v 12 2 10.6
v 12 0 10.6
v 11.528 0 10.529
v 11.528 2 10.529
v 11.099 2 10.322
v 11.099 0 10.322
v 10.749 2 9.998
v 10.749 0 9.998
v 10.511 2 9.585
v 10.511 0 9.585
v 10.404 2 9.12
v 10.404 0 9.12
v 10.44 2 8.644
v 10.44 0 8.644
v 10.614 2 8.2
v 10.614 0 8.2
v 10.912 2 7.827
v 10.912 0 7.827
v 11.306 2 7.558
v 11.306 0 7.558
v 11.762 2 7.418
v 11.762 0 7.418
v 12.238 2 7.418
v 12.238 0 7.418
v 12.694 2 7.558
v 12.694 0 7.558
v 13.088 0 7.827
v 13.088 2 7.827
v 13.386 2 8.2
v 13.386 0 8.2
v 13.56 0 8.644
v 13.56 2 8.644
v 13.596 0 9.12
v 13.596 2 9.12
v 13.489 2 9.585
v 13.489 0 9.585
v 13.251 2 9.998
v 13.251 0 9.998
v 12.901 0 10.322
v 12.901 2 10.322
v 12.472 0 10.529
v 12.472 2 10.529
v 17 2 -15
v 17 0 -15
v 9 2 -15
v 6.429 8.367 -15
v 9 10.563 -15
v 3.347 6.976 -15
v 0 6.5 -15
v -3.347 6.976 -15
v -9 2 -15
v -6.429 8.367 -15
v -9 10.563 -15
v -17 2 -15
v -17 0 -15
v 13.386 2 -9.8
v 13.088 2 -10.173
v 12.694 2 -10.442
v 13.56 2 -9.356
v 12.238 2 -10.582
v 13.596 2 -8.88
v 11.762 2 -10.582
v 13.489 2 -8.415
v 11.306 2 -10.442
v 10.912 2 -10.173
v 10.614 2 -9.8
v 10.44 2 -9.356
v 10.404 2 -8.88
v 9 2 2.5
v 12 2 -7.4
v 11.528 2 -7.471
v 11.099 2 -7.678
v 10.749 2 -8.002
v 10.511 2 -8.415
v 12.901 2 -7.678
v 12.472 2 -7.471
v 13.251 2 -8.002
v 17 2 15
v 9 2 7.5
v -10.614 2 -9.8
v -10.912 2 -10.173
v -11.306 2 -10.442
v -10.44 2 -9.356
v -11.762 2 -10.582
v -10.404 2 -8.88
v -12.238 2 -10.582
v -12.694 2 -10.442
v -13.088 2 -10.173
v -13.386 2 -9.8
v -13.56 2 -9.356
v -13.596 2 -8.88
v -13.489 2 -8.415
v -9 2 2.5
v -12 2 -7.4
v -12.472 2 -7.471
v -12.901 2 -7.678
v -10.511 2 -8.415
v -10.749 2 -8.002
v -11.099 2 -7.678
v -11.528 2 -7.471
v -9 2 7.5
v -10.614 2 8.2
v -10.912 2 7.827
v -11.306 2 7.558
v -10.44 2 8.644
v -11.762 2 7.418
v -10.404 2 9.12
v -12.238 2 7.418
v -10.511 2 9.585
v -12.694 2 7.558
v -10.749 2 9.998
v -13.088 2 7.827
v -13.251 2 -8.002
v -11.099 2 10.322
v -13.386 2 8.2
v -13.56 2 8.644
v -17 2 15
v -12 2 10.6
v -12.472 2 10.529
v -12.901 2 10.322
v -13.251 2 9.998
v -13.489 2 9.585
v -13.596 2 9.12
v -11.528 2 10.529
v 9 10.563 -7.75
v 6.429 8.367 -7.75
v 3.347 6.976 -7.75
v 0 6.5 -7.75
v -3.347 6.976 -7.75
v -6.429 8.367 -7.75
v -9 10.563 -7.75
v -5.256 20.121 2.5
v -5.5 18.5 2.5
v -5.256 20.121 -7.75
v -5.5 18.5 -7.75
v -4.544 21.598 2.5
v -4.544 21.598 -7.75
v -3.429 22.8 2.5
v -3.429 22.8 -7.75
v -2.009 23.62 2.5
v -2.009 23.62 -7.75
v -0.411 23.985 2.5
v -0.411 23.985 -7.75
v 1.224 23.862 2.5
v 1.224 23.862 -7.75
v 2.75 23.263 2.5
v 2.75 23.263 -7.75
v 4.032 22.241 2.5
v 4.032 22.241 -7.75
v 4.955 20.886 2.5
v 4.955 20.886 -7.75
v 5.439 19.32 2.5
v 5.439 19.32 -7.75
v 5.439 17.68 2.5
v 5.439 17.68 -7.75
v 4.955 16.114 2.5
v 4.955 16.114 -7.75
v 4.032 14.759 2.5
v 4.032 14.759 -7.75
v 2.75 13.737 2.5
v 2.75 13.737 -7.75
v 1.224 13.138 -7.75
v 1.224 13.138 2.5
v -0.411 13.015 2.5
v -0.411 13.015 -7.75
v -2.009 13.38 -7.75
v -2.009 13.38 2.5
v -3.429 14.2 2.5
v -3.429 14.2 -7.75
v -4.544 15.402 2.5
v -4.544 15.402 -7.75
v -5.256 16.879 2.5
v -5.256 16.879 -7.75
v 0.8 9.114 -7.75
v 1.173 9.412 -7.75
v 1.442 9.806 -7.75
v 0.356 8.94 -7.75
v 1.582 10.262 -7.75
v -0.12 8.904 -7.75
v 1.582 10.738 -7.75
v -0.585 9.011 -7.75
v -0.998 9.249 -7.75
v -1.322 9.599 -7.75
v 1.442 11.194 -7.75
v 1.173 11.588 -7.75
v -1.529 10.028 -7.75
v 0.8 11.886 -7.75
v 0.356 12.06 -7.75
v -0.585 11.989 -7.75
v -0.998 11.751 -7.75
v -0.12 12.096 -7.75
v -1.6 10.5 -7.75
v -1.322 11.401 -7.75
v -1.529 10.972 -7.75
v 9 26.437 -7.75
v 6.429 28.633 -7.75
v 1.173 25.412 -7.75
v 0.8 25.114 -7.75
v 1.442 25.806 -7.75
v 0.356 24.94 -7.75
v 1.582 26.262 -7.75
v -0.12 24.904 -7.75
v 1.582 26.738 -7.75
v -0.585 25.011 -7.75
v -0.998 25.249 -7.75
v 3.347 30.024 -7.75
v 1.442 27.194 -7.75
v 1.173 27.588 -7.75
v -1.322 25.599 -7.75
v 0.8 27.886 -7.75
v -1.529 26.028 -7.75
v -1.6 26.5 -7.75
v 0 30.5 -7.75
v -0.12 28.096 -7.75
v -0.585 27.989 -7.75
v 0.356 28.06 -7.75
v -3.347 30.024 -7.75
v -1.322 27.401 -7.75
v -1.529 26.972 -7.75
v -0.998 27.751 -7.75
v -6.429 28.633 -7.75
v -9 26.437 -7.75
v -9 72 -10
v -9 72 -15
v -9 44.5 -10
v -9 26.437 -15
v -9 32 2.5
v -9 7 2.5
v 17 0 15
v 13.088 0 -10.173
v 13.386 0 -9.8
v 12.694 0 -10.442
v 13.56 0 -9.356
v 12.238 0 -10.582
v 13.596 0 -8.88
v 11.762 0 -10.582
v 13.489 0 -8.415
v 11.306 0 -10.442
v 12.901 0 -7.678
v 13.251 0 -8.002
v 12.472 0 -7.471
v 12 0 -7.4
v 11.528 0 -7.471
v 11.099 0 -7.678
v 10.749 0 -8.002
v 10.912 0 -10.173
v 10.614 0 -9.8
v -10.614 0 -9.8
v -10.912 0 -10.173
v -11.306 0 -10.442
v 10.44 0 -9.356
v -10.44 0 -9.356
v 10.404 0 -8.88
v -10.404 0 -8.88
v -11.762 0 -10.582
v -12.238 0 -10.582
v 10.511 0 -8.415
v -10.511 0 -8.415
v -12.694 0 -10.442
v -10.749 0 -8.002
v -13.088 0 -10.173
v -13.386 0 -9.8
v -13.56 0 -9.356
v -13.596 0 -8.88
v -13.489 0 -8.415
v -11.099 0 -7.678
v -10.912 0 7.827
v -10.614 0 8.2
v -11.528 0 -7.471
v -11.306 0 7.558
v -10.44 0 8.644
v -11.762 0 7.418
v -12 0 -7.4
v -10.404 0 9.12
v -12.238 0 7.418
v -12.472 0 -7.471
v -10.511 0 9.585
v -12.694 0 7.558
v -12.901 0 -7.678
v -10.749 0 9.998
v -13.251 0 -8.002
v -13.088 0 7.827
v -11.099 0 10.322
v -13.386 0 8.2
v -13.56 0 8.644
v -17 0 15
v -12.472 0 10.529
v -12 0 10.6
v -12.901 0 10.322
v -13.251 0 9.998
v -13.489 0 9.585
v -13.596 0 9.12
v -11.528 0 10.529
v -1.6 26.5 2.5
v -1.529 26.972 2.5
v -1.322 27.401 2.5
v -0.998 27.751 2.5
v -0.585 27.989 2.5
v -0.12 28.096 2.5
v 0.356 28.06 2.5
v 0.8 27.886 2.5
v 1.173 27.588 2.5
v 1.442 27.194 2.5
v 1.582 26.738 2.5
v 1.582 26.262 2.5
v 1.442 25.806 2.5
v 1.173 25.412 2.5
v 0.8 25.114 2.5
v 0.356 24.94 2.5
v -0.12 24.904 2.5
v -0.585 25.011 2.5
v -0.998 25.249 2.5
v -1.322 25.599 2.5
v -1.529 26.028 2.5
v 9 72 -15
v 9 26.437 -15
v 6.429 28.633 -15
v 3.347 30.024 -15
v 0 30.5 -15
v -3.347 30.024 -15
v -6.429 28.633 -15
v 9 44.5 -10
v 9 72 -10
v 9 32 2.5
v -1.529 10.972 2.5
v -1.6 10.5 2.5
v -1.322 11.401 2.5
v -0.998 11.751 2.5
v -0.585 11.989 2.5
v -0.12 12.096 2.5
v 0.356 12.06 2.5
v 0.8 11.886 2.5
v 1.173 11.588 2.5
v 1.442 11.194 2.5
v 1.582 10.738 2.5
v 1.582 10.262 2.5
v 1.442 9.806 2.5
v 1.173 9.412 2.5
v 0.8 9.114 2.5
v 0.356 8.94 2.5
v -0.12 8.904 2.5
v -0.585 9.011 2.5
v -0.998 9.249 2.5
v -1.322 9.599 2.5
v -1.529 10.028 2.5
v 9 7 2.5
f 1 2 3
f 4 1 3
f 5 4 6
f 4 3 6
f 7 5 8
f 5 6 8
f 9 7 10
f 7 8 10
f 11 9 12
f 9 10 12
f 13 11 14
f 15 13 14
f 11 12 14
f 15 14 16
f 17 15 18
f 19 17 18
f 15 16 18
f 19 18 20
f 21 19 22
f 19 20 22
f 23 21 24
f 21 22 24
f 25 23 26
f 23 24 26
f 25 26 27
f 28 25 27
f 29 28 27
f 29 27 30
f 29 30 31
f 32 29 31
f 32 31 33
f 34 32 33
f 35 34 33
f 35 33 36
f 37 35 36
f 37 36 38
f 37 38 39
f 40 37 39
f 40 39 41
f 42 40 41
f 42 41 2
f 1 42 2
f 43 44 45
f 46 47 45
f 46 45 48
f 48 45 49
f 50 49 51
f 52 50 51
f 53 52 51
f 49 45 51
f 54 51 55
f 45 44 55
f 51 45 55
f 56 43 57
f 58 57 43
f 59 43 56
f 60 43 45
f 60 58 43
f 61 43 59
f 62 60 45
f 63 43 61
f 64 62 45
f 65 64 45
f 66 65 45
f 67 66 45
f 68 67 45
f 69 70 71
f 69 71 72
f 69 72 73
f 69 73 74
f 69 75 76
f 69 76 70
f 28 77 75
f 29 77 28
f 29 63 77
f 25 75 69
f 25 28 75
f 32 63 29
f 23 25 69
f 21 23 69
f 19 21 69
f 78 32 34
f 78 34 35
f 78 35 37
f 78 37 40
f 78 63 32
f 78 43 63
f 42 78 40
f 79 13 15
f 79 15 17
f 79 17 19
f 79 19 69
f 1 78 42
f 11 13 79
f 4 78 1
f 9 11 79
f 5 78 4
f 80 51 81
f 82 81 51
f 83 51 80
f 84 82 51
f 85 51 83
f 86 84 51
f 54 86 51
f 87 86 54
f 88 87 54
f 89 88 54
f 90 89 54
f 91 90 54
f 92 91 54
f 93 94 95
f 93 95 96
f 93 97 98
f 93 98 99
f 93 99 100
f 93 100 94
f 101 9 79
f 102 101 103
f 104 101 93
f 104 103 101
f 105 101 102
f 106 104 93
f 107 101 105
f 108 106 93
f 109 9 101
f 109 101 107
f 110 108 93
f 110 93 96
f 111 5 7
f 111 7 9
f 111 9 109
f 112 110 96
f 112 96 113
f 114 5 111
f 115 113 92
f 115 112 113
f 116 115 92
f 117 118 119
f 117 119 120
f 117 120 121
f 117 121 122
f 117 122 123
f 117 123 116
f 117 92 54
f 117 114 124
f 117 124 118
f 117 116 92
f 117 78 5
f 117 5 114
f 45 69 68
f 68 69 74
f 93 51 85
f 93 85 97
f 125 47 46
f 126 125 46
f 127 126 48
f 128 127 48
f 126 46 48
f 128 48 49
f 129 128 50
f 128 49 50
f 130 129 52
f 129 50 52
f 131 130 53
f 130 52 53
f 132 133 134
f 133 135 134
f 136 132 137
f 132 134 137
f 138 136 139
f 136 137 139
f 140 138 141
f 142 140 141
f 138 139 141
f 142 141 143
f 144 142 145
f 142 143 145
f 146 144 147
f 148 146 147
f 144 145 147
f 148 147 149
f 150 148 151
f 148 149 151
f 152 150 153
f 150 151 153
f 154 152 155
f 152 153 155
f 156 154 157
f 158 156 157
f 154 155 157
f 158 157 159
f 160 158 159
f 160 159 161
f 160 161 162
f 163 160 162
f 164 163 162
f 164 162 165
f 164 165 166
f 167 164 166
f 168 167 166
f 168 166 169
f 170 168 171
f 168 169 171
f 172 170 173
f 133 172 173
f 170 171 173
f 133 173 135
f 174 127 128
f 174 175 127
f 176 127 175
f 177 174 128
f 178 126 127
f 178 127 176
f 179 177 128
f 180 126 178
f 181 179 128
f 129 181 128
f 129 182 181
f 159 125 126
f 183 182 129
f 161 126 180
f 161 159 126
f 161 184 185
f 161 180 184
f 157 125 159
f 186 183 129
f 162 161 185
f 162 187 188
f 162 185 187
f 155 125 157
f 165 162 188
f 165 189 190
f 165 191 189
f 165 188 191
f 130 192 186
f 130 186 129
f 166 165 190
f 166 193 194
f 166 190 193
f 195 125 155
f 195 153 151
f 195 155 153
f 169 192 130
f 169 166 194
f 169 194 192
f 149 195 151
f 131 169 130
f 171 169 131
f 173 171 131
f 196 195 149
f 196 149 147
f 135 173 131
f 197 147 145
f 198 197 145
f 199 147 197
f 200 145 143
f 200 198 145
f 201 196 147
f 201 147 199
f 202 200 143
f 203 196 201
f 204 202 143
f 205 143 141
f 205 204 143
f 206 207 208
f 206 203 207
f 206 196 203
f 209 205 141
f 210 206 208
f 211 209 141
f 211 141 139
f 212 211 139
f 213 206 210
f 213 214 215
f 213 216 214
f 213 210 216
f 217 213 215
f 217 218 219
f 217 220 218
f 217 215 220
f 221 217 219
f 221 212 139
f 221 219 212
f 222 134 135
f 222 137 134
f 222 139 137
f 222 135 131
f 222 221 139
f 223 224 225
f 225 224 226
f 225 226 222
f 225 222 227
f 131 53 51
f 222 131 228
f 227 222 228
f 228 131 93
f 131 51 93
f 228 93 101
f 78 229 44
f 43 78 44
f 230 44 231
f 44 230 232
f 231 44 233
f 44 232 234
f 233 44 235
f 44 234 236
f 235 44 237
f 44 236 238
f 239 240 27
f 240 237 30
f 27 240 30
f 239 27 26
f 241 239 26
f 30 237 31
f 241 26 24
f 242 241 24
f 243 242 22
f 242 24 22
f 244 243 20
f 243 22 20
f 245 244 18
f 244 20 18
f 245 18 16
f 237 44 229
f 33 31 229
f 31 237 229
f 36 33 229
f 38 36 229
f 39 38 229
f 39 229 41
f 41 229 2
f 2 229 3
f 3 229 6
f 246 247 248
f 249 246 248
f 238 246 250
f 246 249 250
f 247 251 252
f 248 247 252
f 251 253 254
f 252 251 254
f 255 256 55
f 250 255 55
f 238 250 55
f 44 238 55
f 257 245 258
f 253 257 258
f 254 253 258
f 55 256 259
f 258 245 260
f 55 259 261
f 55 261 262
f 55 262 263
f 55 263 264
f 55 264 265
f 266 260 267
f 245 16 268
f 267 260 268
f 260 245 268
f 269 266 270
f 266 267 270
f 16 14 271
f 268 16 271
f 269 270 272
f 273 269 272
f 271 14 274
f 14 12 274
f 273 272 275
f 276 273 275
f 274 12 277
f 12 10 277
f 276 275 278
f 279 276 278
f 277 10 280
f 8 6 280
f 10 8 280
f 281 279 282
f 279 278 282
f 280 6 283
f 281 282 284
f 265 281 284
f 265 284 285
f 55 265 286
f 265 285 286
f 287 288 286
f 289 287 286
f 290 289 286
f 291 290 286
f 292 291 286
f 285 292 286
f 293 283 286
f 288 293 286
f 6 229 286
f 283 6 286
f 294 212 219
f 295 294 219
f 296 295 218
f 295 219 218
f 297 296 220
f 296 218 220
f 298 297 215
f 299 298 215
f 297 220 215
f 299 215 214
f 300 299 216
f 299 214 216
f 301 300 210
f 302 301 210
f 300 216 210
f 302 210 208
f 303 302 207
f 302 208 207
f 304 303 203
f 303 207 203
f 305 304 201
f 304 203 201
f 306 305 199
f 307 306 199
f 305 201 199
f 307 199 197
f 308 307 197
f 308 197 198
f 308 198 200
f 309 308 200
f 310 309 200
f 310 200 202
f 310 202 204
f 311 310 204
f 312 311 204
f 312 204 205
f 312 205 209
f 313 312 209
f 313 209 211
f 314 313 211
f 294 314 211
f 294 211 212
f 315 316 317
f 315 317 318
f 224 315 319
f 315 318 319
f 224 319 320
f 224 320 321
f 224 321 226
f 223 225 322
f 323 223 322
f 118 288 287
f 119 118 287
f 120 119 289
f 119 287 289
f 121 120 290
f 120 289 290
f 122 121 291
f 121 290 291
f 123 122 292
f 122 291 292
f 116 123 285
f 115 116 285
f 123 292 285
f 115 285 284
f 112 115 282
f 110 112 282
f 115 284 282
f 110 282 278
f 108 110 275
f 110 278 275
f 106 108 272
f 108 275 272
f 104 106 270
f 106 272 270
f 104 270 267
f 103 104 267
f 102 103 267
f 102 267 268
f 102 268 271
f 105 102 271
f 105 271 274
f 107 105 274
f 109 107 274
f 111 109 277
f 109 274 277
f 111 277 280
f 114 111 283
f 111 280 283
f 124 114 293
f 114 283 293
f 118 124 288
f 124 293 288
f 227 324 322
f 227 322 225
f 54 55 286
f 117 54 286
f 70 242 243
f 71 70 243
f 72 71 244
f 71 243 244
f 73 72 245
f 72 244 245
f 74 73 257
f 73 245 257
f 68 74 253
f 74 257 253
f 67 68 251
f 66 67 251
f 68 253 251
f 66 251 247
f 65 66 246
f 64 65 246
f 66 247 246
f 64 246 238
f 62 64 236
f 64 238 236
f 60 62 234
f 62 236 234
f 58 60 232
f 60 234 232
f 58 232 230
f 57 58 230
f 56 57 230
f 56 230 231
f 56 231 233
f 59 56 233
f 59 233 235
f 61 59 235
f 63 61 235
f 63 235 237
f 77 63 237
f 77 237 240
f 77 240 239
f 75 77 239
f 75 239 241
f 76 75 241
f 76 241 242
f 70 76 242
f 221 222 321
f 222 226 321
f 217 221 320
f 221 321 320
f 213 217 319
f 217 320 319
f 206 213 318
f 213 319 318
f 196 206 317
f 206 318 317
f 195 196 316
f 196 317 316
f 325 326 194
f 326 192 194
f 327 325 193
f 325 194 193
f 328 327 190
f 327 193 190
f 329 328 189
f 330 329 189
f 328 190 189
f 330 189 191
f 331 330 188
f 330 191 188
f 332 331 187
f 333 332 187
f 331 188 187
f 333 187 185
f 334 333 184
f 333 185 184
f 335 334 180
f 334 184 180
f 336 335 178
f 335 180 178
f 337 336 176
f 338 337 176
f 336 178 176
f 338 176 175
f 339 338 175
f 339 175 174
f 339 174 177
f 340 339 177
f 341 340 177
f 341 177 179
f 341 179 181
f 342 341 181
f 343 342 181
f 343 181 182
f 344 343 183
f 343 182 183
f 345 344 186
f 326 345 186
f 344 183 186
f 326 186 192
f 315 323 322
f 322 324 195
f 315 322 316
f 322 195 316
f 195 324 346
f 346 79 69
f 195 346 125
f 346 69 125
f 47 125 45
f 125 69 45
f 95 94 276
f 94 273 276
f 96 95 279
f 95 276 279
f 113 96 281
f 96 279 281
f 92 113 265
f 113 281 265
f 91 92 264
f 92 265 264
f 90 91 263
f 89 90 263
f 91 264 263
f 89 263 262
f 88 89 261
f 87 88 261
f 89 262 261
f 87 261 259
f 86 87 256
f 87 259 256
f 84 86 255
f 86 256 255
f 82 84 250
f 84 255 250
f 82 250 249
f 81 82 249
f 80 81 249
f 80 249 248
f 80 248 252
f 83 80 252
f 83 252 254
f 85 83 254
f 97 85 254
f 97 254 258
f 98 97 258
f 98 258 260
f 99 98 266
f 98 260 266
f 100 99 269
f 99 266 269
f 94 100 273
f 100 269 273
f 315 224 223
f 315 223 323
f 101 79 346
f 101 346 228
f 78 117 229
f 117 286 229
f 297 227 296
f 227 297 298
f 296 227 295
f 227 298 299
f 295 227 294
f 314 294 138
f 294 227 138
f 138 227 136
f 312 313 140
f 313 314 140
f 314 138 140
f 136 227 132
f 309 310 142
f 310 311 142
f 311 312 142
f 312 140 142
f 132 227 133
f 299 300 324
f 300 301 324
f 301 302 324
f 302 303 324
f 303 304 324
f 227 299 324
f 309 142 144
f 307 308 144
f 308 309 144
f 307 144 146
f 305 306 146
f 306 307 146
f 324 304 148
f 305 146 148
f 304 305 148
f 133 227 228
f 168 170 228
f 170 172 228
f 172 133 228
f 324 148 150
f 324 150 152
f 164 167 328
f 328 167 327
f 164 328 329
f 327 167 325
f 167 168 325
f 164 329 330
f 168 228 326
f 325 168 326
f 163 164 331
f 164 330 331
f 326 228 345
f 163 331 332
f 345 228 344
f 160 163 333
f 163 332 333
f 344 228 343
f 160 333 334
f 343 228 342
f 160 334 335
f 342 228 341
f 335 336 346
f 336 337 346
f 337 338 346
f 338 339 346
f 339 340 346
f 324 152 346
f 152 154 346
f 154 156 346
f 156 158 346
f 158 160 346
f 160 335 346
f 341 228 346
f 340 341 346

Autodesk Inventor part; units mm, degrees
ref_plane "YZ Plane" through (0, 0, 0) normal (1, 0, 0) x (0, 1, 0)
ref_plane "XZ Plane" through (0, 0, 0) normal (0, 1, 0) x (-1, 0, 0)
ref_plane "XY Plane" through (0, 0, 0) normal (0, 0, 1) x (1, 0, 0)
sketch "Sketch1" plane through (0, 0, 0) normal (0, 1, 0) x (-1, 0, 0)
  line L0 (-17, -15) -> (17, -15)
  line L1 (17, -15) -> (17, 15)
  line L2 (17, 15) -> (-17, 15)
  line L3 (-17, 15) -> (-17, -15)
  line L4 (-17, -15) -> (17, 15) construction
  line L5 (17, -15) -> (-17, 15) construction
  point P0 (0, 0)
  dimension "d0" = 34
  dimension "d1" = 30
extrude "Extrusion1" add sketch "Sketch1" along normal blind 2
sketch "Sketch2" plane through (0, 2, 0) normal (0, 1, 0) x (1, 0, 0)
  line L0 (-17, 15) -> (-17, -15) projected
  line L1 (-17, -15) -> (17, -15) projected
  line L2 (17, -15) -> (17, 15) projected
  line L3 (17, 15) -> (-17, 15) projected
  line L4 (-12, 9) -> (-12, -9) construction
  line L5 (-12, -9) -> (12, -9) construction
  line L6 (12, -9) -> (12, 9) construction
  line L7 (-12, 0) -> (0, 0) construction
  line L8 (0, 0) -> (0, -9) construction
  dimension "d5" = 24
  dimension "d6" = 18
hole "Hole1" at (-12, 2, -9) at (-12, 2, 9) at (12, 2, 9) at (12, 2, -9) direction (0, -1, 0) diameter 3.2 end through all
sketch "Sketch3" plane through (0, 2, 0) normal (0, 1, 0) x (1, 0, 0)
  circle A0 centre (12, 9) radius 1.6 projected
  circle A1 centre (12, -9) radius 1.6 projected
  circle A2 centre (-12, -9) radius 1.6 projected
  circle A3 centre (-12, 9) radius 1.6 projected
  line L0 (-17, 15) -> (-17, -15) projected
  line L1 (-17, -15) -> (17, -15) projected
  line L2 (17, -15) -> (17, 15) projected
  line L3 (17, 15) -> (-17, 15) projected
  line L4 (-17, -2.5) -> (17, -2.5)
  circle A4 centre (-12, 9) radius 3
  circle A5 centre (12, 9) radius 3
  line L5 (-9, 15) -> (-9, -15)
  line L6 (9, 15) -> (9, -15)
  point P0 (0, 0)
  point P1 (9, -2.5)
  point P2 (-9, -2.5)
  dimension "d14" = 17.5
  dimension "d15" = 6
  dimension "d16" = 8
  dimension "d17" = 8
extrude "Extrusion2" add sketch "Sketch3" along normal blind 30 contours L3 L6 L4 L5
sketch "Sketch4" plane through (17, 0, -15) normal (0, 0, -1) x (-1, 0, 0)
  line L0 (0, 0) -> (34, 0) projected
  line L1 (34, 0) -> (34, 2) projected
  line L2 (26, 2) -> (34, 2) projected
  line L3 (26, 2) -> (26, 32) projected
  line L4 (8, 32) -> (26, 32) projected
  line L5 (8, 2) -> (8, 32) projected
  line L6 (0, 2) -> (8, 2) projected
  line L7 (0, 0) -> (0, 2) projected
  circle A0 centre (17, 18.5) radius 5.5
  line L8 (17, 18.5) -> (17, 0) construction
  circle A1 centre (17, 18.5) radius 12
  line L9 (17, 18.5) -> (17, 26.5) construction
  circle A2 centre (17, 10.5) radius 1.6
  circle A3 centre (17, 26.5) radius 1.6
  point P0 (26, 26.4373)
  point P1 (8, 26.4373)
  point P2 (8, 10.5627)
  point P3 (26, 10.5627)
  dimension "d20" = 18.5
  dimension "d21" = 24
  dimension "d22" = 11
  dimension "d24" = 8
  dimension "d29" = 3.2
  dimension "d30" = 8
extrude "Extrusion3" cut sketch "Sketch4" against normal blind 7.25 contours L5 A1 L3 | A0 | A2 | A3
extrude "Extrusion4" cut sketch "Sketch4" against normal through all contours A0 | A2 | A3
sketch "Sketch6" plane through (0, 32, 0) normal (0, 1, 0) x (1, 0, 0)
  line L0 (9, 15) -> (-9, 15) projected
  line L1 (-9, 15) -> (-9, -2.5) projected
  line L2 (-9, -2.5) -> (9, -2.5) projected
  line L3 (9, -2.5) -> (9, 15) projected
  line L4 (-9, 10) -> (9, 10)
  point P0 (0, 0)
  dimension "d33" = 5
extrude "Extrusion6" add sketch "Sketch6" along normal blind 40 contours L3 L4 L1 L0
chamfer "Chamfer1" distance 12.5 angle 45 1 edges at (0, 32, -10)
chamfer "Chamfer2" distance 5 angle 45 1 edges at (0, 2, 2.5)
equation "\"d17\" = d16"
equation "\"d24\" = d30"
